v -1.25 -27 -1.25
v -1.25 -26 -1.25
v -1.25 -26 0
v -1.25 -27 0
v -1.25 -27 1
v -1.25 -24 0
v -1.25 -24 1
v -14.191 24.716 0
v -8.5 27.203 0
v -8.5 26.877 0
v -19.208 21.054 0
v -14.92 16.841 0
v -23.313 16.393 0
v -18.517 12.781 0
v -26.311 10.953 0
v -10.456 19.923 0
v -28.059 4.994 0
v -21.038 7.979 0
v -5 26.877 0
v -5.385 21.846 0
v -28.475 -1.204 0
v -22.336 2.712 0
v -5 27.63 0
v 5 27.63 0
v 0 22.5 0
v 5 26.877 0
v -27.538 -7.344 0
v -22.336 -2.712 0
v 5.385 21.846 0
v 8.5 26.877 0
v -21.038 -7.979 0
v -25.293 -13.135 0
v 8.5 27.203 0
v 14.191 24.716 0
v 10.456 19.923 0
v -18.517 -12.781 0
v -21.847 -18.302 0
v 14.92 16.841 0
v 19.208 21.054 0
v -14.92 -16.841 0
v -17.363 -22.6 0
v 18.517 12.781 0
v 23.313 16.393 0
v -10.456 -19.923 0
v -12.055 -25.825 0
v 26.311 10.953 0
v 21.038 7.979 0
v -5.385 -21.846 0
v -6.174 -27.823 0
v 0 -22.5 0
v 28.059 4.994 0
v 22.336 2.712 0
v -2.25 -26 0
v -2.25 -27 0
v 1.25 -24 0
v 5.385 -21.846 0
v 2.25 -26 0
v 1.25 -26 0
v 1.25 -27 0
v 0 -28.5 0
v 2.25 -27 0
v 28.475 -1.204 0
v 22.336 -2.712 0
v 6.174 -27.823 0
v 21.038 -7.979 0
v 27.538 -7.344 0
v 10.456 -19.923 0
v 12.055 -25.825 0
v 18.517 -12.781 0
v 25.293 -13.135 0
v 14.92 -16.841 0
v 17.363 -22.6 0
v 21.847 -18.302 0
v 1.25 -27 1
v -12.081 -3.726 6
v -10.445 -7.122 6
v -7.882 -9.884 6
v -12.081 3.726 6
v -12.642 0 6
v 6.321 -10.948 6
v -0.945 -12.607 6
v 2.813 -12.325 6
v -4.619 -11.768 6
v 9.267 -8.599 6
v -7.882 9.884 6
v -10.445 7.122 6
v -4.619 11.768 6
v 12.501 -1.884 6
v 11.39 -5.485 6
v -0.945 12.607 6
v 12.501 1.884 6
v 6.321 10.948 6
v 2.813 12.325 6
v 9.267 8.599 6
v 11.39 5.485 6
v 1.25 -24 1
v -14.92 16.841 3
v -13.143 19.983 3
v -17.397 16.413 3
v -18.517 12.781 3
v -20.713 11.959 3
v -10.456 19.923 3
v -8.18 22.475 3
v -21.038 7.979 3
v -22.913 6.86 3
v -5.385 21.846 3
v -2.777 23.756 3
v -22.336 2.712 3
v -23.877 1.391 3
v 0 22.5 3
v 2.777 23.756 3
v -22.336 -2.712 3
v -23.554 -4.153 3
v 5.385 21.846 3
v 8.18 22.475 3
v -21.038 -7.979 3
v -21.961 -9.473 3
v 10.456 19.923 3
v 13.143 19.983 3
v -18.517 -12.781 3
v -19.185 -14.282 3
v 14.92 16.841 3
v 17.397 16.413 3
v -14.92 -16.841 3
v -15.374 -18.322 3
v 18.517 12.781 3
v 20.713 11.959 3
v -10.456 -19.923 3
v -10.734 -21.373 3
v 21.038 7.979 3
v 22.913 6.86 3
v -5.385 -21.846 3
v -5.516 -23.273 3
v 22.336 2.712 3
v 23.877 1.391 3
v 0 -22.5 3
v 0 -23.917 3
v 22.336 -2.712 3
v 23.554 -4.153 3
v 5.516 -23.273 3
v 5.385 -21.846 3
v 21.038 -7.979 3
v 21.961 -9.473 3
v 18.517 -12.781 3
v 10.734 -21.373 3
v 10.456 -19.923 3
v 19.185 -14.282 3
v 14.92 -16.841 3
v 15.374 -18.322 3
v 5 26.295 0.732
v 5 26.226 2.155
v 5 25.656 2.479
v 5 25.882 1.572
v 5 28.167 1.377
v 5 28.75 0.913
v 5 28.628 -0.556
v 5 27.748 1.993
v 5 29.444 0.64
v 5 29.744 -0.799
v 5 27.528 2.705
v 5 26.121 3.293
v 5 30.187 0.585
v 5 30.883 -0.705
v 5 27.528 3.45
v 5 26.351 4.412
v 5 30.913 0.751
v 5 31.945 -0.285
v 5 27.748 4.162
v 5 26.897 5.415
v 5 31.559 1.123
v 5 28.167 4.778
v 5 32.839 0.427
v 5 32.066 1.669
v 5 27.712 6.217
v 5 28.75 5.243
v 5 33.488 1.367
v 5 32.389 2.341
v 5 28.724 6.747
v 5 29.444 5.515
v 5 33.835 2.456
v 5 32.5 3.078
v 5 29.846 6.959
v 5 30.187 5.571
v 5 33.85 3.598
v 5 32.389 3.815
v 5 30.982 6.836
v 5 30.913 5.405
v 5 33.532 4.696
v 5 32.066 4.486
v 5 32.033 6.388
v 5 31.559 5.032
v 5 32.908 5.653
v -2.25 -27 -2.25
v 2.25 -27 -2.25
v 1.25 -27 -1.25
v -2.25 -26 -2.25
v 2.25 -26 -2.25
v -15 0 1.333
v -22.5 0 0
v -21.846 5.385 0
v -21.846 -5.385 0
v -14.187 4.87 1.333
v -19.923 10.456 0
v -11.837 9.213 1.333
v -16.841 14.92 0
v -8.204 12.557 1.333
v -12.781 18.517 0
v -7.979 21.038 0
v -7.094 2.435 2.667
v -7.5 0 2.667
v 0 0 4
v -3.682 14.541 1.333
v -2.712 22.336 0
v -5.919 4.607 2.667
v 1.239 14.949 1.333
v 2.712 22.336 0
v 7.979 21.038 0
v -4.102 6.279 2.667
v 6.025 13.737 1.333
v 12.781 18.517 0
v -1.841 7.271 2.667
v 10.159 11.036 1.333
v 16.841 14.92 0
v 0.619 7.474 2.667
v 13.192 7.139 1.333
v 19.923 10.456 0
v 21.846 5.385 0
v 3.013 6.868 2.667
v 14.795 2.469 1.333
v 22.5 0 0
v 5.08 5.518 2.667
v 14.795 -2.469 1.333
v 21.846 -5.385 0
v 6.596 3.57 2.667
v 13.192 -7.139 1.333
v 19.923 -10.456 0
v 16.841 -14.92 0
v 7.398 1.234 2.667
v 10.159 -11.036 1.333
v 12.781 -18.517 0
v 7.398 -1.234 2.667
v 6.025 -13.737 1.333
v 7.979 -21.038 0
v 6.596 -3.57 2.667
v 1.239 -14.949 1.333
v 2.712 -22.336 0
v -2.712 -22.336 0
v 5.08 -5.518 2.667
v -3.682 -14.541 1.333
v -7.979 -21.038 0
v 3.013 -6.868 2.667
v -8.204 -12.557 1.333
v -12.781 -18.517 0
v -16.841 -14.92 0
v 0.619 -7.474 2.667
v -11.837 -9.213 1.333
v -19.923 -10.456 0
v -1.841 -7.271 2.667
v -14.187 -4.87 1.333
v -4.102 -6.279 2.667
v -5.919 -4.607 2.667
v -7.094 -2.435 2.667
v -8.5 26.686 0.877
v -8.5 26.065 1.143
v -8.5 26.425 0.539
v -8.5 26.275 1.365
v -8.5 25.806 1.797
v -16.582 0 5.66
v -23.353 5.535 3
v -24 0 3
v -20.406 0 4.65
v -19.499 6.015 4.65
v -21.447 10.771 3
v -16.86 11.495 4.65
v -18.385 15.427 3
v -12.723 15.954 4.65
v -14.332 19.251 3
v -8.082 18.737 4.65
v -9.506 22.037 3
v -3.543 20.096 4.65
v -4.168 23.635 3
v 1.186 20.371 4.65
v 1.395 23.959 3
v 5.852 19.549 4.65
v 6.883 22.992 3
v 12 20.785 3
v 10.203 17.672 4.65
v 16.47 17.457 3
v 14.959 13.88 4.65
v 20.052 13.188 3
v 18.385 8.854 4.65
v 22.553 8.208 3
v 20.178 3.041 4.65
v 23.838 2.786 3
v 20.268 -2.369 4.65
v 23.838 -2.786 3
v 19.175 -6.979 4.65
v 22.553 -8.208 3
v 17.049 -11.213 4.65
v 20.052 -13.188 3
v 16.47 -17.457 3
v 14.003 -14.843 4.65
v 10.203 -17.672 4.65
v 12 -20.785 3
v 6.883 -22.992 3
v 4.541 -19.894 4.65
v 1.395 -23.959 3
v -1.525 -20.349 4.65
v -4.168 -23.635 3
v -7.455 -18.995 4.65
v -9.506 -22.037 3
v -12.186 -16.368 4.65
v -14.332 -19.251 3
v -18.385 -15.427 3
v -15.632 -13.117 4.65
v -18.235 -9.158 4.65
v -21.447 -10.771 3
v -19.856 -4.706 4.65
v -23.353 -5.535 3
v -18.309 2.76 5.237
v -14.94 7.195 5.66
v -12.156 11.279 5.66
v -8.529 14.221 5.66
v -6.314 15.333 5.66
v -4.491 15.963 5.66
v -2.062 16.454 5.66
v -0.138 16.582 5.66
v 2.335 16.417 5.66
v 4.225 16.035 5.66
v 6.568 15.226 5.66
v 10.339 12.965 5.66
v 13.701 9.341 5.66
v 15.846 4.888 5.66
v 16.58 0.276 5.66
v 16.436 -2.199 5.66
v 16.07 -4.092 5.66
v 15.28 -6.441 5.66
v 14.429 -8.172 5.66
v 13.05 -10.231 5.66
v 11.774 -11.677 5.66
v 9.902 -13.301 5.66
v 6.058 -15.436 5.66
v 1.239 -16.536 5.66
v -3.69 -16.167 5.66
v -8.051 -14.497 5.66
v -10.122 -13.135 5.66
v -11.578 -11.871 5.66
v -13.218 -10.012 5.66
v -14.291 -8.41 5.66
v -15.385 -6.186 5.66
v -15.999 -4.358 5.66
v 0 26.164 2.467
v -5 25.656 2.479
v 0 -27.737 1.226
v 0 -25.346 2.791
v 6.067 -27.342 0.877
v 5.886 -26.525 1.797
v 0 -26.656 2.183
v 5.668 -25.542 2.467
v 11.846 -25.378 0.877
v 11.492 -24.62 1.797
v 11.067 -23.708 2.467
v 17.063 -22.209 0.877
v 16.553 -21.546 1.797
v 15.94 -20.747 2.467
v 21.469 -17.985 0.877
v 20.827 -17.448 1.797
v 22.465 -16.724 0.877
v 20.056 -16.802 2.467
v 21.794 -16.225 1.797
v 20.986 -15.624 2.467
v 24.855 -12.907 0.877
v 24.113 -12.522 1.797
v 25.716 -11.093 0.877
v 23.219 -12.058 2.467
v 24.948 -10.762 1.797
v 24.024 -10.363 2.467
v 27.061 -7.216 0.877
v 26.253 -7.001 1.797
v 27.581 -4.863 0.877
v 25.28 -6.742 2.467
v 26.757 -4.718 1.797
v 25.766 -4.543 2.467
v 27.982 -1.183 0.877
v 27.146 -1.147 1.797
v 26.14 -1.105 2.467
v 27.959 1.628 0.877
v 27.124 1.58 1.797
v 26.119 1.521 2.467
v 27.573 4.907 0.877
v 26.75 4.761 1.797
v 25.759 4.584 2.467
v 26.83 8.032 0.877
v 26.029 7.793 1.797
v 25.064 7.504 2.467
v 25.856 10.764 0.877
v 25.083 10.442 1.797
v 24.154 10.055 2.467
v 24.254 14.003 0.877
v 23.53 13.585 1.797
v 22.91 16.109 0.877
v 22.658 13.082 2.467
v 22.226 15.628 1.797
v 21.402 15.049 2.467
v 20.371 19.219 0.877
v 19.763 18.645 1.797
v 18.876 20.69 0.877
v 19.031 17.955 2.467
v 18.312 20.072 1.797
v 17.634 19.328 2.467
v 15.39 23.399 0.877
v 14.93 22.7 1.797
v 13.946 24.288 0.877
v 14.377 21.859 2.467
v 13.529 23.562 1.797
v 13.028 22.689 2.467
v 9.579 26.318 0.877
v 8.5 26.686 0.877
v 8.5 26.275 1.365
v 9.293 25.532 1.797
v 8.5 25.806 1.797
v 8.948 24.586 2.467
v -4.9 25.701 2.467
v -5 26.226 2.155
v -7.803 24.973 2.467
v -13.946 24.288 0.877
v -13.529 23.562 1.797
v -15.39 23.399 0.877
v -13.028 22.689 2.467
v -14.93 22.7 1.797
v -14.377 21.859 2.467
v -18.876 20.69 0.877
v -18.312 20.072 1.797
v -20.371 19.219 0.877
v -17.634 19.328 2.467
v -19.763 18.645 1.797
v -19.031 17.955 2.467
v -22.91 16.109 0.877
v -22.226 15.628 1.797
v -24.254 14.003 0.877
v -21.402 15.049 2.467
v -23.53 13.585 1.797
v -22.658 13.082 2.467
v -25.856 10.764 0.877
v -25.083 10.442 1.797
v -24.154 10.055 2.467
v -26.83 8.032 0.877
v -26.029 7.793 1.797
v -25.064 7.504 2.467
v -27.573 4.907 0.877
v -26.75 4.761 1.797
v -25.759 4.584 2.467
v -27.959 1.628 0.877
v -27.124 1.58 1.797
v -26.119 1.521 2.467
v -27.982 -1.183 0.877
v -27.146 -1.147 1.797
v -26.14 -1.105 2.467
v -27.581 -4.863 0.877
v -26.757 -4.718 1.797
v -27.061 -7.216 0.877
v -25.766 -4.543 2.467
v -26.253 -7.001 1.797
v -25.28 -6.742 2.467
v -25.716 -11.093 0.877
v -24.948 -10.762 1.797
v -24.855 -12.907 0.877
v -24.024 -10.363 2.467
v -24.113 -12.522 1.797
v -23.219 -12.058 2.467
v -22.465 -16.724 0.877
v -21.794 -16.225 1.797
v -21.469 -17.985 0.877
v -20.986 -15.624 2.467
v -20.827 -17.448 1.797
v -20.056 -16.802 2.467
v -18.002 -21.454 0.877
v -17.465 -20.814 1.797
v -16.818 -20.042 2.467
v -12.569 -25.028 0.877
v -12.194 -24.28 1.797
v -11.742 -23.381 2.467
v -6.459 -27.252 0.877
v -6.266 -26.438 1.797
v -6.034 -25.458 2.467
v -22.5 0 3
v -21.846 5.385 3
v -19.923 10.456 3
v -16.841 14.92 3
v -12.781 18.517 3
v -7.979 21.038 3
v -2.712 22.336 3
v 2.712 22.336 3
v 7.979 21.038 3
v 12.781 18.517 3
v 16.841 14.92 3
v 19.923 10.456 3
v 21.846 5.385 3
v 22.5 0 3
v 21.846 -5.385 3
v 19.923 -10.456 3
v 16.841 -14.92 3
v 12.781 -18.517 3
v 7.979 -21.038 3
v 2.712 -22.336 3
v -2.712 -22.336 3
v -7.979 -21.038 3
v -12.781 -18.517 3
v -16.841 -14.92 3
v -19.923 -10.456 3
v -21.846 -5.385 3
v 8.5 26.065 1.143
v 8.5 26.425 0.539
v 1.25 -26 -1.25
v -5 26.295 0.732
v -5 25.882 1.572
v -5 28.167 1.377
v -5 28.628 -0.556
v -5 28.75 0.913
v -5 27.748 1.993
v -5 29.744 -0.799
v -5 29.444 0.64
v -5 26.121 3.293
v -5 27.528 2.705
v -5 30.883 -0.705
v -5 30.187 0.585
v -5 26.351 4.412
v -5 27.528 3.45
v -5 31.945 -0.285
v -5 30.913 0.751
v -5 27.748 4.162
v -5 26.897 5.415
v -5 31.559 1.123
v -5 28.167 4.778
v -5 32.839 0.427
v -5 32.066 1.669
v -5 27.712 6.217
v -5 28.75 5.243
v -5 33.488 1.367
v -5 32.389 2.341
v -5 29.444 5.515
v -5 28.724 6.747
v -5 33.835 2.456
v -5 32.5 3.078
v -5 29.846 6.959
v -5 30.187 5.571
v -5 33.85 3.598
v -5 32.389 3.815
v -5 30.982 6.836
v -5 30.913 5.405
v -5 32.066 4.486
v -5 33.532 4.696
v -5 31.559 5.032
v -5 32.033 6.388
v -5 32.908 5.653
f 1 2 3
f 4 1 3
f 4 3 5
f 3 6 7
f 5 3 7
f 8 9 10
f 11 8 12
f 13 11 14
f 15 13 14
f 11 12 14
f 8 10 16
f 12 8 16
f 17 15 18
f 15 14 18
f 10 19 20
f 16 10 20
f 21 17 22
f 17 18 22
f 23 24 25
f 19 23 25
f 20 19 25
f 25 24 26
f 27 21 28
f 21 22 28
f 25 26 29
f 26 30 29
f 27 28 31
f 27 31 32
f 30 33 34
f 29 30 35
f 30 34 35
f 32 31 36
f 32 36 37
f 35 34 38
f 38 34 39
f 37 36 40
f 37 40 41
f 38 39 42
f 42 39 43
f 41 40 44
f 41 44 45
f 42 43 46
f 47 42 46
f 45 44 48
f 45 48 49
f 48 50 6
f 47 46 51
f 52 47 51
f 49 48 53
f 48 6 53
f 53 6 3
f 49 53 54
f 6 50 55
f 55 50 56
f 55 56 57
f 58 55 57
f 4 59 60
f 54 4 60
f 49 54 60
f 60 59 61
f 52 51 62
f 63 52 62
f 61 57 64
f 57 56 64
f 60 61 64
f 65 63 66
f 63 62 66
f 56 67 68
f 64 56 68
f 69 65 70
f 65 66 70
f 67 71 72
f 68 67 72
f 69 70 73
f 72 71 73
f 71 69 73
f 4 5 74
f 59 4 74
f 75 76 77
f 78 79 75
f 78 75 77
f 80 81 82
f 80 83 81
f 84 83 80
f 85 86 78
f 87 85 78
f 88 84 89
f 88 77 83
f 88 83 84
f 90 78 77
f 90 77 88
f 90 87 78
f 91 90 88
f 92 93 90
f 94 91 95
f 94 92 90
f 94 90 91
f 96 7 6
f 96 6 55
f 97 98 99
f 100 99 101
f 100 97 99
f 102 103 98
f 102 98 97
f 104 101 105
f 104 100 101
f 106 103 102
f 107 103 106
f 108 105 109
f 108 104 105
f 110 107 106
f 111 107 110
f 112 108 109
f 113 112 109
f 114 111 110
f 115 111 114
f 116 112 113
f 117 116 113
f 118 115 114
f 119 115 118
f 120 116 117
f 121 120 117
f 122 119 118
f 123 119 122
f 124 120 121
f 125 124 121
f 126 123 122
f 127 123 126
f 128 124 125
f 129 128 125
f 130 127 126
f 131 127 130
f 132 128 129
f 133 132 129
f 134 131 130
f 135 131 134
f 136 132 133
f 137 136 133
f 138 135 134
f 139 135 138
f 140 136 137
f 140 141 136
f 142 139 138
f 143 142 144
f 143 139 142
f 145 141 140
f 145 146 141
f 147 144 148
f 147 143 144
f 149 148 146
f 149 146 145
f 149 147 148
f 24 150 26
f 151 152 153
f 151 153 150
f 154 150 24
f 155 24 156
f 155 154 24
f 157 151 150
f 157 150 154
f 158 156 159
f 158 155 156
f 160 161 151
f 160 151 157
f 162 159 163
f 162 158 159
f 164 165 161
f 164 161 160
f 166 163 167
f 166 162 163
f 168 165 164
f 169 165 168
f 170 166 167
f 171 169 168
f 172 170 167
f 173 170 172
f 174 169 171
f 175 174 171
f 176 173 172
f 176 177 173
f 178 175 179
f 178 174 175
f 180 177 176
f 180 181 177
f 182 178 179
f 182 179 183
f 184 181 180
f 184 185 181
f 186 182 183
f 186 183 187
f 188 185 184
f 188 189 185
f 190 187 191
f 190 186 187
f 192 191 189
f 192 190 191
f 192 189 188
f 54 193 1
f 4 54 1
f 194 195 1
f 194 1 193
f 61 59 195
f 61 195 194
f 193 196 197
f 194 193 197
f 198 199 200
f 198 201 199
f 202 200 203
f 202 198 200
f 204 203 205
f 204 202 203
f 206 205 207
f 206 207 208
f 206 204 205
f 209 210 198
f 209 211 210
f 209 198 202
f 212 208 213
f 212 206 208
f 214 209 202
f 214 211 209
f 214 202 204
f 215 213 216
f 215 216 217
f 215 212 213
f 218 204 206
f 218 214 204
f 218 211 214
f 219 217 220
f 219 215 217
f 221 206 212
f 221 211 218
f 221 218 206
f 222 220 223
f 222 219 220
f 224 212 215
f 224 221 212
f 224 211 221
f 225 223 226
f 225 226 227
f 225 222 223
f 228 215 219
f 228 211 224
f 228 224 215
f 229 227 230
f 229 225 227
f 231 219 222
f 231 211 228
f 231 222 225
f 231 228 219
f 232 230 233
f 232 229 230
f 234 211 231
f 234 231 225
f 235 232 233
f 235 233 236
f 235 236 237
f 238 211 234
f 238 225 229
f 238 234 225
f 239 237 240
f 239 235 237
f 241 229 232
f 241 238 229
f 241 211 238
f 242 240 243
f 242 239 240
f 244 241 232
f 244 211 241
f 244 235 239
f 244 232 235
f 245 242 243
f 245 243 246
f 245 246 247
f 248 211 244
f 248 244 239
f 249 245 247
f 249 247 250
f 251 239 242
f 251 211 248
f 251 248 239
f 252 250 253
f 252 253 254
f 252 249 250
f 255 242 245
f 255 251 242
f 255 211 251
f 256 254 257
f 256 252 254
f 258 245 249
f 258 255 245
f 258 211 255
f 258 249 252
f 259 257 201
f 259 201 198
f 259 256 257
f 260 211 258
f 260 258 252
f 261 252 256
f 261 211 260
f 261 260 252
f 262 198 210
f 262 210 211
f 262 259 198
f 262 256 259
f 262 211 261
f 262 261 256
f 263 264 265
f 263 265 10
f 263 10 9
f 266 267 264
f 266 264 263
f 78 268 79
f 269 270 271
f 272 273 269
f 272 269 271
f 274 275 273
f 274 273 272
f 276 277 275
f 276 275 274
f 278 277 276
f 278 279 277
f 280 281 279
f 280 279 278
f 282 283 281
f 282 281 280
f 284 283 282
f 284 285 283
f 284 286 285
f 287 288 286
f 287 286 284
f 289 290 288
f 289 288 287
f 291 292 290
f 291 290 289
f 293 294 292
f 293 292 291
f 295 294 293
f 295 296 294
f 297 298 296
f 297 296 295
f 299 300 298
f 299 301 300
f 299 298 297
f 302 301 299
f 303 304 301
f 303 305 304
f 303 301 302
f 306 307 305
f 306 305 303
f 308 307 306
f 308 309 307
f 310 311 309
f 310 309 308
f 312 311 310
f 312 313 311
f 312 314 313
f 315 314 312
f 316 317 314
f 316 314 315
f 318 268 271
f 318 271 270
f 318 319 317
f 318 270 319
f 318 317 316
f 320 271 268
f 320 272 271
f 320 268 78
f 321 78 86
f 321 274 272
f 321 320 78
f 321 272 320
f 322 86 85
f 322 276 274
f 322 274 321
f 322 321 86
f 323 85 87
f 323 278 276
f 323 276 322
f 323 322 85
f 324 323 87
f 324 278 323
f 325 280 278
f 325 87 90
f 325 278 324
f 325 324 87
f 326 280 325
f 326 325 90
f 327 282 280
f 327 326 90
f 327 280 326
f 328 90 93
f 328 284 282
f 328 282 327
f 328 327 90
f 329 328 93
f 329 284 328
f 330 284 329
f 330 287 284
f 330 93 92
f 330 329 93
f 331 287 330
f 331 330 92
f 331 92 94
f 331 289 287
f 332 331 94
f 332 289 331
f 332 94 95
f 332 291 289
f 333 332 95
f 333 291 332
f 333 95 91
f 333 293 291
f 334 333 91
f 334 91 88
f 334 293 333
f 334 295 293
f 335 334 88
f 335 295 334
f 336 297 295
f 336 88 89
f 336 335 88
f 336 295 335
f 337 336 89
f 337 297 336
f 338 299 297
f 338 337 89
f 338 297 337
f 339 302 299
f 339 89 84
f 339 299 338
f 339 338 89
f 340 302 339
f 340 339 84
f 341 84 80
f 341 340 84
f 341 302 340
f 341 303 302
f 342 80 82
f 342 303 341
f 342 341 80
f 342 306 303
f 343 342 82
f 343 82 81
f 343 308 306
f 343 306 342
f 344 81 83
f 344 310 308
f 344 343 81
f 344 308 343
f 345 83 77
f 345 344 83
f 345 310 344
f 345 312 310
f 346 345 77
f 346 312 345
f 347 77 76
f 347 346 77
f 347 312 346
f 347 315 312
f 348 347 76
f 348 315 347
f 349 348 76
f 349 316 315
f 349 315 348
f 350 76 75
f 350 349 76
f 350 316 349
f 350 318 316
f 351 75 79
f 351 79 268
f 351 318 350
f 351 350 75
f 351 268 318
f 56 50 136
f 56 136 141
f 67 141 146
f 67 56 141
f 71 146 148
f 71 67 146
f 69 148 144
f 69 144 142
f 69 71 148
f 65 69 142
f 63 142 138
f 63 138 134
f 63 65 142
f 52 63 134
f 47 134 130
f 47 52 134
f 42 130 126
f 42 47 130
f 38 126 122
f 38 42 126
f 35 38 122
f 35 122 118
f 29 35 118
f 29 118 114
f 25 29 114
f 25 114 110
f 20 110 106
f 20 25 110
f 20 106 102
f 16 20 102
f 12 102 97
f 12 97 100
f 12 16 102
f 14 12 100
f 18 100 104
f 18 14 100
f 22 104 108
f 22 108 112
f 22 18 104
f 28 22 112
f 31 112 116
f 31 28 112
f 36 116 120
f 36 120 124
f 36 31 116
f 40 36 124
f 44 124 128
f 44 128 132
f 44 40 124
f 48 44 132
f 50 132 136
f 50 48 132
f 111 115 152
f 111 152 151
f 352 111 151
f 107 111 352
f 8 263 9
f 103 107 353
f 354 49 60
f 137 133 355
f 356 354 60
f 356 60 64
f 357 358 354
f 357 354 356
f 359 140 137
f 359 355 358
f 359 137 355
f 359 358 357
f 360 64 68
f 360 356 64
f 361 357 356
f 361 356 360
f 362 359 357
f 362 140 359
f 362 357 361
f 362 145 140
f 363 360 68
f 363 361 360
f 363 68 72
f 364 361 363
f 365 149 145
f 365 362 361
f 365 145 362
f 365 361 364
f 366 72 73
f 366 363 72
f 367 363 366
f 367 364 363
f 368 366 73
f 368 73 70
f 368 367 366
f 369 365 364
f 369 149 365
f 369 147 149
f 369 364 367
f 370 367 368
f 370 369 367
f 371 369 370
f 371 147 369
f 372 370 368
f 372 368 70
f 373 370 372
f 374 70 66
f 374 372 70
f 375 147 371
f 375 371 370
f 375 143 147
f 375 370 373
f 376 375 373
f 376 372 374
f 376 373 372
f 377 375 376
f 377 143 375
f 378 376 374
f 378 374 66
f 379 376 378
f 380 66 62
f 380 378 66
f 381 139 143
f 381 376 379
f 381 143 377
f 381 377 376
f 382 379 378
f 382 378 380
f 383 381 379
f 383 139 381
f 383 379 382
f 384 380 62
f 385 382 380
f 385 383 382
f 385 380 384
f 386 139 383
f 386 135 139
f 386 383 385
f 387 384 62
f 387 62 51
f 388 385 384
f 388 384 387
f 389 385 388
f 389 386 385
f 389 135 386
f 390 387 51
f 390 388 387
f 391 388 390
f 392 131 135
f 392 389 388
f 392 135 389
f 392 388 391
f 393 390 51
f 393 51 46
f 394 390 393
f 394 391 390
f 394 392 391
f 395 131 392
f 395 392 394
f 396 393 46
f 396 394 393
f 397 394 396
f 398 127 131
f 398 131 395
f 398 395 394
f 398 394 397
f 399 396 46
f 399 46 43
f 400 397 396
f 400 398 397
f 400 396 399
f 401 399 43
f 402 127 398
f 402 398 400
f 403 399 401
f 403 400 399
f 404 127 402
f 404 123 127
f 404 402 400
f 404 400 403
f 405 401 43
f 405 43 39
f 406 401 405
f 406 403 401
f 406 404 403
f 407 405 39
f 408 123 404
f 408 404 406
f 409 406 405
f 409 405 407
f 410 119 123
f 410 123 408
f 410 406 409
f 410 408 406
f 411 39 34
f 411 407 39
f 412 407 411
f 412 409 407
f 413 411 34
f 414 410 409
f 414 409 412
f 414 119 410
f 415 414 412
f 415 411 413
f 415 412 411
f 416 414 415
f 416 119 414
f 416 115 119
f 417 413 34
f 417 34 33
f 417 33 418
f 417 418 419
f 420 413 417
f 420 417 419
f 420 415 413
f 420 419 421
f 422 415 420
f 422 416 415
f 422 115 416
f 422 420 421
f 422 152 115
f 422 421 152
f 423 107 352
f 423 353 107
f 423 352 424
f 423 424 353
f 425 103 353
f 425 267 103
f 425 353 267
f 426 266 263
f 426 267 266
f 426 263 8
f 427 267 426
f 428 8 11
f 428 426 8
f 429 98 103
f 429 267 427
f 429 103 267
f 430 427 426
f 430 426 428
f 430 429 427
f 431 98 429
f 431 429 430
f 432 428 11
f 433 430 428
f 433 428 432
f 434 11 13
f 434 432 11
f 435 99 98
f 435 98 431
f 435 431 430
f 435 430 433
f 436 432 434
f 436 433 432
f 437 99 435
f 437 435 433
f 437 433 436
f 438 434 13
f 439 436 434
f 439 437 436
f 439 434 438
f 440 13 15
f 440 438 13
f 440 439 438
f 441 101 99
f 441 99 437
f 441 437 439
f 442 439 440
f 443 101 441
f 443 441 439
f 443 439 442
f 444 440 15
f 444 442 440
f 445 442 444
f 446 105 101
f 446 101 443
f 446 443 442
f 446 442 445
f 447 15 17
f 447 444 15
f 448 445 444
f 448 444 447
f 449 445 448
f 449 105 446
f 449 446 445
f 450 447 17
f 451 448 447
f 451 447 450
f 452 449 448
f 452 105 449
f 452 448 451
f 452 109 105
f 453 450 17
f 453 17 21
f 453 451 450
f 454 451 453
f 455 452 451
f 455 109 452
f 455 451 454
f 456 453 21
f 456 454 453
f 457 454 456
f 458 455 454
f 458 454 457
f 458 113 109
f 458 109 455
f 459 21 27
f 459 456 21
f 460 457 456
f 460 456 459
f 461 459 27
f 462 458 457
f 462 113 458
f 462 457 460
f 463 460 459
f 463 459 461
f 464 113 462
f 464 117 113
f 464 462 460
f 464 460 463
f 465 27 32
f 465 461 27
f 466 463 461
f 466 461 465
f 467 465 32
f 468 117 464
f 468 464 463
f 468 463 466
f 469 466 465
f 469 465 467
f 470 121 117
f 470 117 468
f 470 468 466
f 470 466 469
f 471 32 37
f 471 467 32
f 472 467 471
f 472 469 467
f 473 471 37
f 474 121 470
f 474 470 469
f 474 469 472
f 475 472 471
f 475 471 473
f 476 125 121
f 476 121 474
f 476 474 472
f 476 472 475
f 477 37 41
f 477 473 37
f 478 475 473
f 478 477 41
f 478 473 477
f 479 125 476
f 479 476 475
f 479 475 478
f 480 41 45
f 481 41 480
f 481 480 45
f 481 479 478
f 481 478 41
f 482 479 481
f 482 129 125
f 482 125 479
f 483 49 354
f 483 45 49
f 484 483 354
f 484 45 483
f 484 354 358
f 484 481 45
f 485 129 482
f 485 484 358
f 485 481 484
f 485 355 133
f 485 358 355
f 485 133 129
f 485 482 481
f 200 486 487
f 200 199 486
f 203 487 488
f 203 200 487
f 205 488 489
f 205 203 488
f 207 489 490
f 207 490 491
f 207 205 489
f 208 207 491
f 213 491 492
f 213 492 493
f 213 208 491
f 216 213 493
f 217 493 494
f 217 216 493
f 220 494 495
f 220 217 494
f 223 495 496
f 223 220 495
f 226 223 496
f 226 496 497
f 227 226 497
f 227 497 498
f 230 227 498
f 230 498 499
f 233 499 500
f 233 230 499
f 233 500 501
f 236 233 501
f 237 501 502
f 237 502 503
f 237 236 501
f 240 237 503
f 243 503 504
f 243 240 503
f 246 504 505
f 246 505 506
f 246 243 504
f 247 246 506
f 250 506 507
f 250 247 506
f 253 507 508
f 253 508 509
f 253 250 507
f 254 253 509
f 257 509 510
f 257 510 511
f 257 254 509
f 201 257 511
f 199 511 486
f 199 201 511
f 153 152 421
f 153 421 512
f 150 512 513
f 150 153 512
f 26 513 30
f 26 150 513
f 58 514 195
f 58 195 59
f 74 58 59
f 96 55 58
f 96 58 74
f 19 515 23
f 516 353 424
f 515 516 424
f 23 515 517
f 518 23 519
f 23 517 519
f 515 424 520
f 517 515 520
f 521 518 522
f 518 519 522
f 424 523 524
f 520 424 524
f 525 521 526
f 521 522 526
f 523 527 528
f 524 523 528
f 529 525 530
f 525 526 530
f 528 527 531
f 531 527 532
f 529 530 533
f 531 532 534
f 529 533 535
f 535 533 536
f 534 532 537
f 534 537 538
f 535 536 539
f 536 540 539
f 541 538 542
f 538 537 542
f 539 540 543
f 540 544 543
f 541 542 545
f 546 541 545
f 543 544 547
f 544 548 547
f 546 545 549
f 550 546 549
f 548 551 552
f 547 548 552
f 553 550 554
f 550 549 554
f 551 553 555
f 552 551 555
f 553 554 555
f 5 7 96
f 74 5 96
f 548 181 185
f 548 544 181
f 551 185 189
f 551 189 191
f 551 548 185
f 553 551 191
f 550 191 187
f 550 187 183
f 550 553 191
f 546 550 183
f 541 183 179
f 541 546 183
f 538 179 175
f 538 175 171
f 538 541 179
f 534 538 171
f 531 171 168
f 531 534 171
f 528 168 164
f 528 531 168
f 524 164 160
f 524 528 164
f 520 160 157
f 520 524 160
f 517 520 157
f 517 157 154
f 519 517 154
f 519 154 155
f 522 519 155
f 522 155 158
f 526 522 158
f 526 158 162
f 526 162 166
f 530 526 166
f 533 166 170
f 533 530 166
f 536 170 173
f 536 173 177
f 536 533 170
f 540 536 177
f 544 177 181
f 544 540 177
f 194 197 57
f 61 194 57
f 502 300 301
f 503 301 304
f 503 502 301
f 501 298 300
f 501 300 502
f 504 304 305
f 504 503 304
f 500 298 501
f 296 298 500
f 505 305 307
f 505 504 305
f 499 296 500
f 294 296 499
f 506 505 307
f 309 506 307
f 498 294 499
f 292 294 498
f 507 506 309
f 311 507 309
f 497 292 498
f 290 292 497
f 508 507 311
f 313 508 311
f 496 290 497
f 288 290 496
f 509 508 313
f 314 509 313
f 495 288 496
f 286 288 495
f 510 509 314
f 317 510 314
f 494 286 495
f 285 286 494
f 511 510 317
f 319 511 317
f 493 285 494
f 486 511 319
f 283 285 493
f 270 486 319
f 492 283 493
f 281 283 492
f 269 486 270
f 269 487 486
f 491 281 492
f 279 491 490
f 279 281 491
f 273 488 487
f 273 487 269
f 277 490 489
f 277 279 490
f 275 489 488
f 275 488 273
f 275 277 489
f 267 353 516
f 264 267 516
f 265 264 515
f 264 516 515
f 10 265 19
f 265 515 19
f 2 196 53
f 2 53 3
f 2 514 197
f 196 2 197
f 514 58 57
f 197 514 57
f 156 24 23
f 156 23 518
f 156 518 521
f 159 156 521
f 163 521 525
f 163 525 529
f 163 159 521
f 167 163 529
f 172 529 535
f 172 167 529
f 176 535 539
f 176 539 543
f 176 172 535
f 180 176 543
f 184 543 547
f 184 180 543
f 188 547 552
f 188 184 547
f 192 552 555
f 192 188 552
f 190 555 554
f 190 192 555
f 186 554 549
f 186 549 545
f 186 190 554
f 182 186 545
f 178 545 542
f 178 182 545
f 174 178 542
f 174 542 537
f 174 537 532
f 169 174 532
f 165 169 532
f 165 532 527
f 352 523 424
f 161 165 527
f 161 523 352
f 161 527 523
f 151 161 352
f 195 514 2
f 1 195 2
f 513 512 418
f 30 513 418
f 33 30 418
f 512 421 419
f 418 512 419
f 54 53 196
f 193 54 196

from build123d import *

# Parameters (mm, degrees)
F0_R      = 28.5
F0_R_2    = 22.5
F1_DEPTH  = 3
F3_ANGLE  = -90
F4_W      = 1.5
F4_H      = 3
F7_START  = 26
F7_DEPTH  = 1
F8_R      = 3.88474
F8_R_2    = 2.5
F9_DEPTH  = 5
F10_START = -5
F8_R_3    = 4.38474
F10_DEPTH = 3.5
F11_START = 5
F11_DEPTH = 3.5
F12_START = 24
F4_W_2    = 2.5
F4_H_2    = 1
F12_DEPTH = 3


# Not quite as in the source:
# - a fillet or chamfer that OpenCascade refuses, or shapes differently, is made with other operations: its cross-section is extruded or revolved along the edge and cut away or added


with BuildPart() as f1:
    # F0 (on Top) → F1 (new body)
    with BuildSketch(Plane.XY):
        Circle(F0_R)
        Circle(F0_R_2, mode=Mode.SUBTRACT)
    extrude(amount=F1_DEPTH)

    # F2: fillet of radius 5 on 1 edges, made by hand

    # F2_s1 → F2_t2 (revolve, cut)
    with BuildSketch(Plane.XZ):
        with BuildLine():
            ThreePointArc((28.5, 0), (26.6560370926, 2.1833001327), (23.917424305, 3))
            Line((23.917424305, 3), (28.5, 3))
            Line((28.5, 3), (28.5, 0))
        make_face()
    revolve(axis=Axis((0, 0, 3), (0, 0, 1)), mode=Mode.SUBTRACT)


with BuildPart() as f1_1:
    # F3: moved
    add(f1.part.rotate(Axis((0, 0, -1.9999999998), (0, 0, 1)), F3_ANGLE))

    # F4 (on Front) → F7 (join)
    with BuildSketch(Plane.XZ.offset(F7_START)):
        Polygon((1.25, -1.25), (-1.25, -1.25), (-1.25, 0), (-2.25, 0), (-2.25, -2.25), (2.25, -2.25), (2.25, 0), (1.25, 0), align=None)
    extrude(amount=F7_DEPTH)

    # F8 (on Right) → F9 (join, symmetric)
    with BuildSketch(Plane.YZ):
        with Locations((30, 3.07777)):
            Circle(F8_R)
        with Locations((30, 3.07777)):
            Circle(F8_R_2, mode=Mode.SUBTRACT)
    extrude(amount=F9_DEPTH, both=True)

    # F8 (on Right) → F10 (cut)
    with BuildSketch(Plane.YZ.offset(F10_START)):
        with Locations((30, 3.07777)):
            Circle(F8_R_3)
        with Locations((30, 3.07777)):
            Circle(F8_R, mode=Mode.SUBTRACT)
        with Locations((30, 3.07777)):
            Circle(F8_R)
        with Locations((30, 3.07777)):
            Circle(F8_R_2, mode=Mode.SUBTRACT)
    extrude(amount=-F10_DEPTH, mode=Mode.SUBTRACT)

    # F8 (on Right) → F11 (cut)
    with BuildSketch(Plane.YZ.offset(F11_START)):
        with Locations((30, 3.07777)):
            Circle(F8_R_3)
        with Locations((30, 3.07777)):
            Circle(F8_R, mode=Mode.SUBTRACT)
        with Locations((30, 3.07777)):
            Circle(F8_R)
        with Locations((30, 3.07777)):
            Circle(F8_R_2, mode=Mode.SUBTRACT)
    extrude(amount=F11_DEPTH, mode=Mode.SUBTRACT)

    # F4 (on Front) → F12 (cut)
    with BuildSketch(Plane.XZ.offset(F12_START)):
        with Locations((0, 0.5)):
            Rectangle(F4_W_2, F4_H_2)
    extrude(amount=F12_DEPTH, mode=Mode.SUBTRACT)


with BuildPart() as f5:
    # F4 (on Front) → F5 (revolve)
    with BuildSketch(Plane.XZ):
        Polygon((0, 4), (0, 6), (-22.5, 6), (-22.5, 3), align=None)
        with Locations((-23.25, 4.5)):
            Rectangle(F4_W, F4_H)
        Polygon((-22.5, 0), (0, 4), (-22.5, 3), align=None)
    revolve(axis=Axis((0, 0, 5), (0, 0, -1)))

    # F6: fillet of radius 23 on 1 edges, made by hand

    # F6_s1 → F6_t2 (revolve, cut)
    with BuildSketch(Plane.XZ):
        with BuildLine():
            ThreePointArc((-12.6421833084, 6), (-18.5158533706, 5.2373559579), (-24, 3))
            Line((-24, 3), (-24, 6))
            Line((-24, 6), (-12.6421833084, 6))
        make_face()
    revolve(axis=Axis((0, 0, 6), (0, 0, -1)), mode=Mode.SUBTRACT)


solid = Compound([f1_1.part, f5.part])
